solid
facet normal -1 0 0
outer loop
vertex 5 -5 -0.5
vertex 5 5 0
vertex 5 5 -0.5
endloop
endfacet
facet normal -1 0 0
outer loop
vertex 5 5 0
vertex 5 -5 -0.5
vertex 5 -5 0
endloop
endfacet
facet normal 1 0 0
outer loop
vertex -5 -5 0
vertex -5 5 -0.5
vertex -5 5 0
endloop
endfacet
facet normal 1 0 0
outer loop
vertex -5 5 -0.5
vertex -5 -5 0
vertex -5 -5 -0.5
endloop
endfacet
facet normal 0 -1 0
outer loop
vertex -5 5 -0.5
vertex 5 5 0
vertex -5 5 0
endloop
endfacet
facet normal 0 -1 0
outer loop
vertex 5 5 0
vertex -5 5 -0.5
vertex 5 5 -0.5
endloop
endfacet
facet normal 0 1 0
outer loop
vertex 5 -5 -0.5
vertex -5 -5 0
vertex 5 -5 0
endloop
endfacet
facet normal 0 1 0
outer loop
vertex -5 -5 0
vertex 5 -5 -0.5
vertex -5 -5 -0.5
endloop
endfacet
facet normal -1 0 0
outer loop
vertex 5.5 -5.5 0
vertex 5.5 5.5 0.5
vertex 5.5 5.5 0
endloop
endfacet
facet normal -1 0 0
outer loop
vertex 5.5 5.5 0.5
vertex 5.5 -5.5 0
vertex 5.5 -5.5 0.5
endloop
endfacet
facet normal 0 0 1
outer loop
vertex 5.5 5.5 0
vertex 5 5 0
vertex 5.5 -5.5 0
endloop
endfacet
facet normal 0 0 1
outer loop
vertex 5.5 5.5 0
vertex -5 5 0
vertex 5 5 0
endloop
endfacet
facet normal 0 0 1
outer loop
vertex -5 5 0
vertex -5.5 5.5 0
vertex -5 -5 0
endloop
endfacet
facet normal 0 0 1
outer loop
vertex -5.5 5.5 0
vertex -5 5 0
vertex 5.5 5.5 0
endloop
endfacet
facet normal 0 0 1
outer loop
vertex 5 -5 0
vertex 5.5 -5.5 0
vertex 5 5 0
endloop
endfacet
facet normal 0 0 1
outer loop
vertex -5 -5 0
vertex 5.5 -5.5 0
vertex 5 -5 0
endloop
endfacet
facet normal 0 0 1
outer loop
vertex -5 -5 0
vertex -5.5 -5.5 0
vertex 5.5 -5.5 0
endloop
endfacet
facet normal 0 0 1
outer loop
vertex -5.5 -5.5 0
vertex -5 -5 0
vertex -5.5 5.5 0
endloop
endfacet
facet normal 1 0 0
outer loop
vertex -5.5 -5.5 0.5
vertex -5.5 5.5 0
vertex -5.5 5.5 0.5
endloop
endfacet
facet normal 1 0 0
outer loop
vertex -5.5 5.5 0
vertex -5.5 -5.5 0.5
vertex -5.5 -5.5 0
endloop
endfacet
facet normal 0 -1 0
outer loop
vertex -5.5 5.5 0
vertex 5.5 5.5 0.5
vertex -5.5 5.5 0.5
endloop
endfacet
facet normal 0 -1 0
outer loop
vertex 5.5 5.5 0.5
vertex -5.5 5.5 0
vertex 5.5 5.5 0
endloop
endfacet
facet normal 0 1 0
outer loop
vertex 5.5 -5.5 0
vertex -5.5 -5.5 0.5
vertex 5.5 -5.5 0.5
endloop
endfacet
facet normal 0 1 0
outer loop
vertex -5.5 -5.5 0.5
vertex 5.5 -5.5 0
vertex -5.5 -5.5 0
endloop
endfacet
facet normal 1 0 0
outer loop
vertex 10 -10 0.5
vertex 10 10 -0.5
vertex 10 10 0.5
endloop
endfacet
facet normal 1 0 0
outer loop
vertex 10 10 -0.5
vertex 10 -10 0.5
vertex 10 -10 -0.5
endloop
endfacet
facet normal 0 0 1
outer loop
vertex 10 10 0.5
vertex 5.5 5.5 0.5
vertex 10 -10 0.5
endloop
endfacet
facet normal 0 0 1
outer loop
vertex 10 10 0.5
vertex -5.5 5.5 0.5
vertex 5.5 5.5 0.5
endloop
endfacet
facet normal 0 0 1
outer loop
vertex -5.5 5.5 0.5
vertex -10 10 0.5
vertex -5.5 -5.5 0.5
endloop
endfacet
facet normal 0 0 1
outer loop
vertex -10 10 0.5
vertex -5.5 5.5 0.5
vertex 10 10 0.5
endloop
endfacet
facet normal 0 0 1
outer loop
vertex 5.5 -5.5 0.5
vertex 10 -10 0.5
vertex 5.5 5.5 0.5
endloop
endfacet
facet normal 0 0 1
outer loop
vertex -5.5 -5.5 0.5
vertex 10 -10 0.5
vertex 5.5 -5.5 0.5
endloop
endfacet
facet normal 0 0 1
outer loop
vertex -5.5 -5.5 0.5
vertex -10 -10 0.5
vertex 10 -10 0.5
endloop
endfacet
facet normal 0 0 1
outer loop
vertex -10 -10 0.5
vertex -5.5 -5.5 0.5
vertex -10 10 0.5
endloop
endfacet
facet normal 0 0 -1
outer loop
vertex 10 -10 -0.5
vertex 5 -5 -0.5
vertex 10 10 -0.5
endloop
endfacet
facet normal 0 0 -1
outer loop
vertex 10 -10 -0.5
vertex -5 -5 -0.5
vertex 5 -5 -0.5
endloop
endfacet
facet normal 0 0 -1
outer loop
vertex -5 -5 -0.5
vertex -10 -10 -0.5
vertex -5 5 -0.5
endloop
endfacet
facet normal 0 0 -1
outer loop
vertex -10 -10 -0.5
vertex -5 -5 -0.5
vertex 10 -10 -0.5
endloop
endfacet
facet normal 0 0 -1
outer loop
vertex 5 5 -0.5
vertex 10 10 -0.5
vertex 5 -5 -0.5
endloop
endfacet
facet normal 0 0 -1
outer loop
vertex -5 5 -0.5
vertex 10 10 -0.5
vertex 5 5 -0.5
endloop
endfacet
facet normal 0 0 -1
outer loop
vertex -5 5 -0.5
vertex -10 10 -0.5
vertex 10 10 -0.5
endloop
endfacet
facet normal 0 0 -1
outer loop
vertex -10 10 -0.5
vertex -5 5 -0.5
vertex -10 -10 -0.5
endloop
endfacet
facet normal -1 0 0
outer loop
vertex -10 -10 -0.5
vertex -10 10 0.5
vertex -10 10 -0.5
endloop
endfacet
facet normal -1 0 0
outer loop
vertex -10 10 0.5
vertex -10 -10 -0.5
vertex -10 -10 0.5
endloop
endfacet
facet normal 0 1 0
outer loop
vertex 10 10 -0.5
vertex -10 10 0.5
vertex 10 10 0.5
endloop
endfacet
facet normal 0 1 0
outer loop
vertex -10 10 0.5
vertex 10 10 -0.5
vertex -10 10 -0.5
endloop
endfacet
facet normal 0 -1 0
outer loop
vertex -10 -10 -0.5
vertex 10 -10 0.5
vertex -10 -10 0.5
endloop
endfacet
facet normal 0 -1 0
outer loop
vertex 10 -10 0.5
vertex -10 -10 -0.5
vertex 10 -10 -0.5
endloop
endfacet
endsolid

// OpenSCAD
// not sure if a complicate subtraction is the right way to go
// also this isn't quite correct

height = 1;

difference() { 

  cube([20,20,height], center = true);


   group() { 
    color( "red") {
       cube([10,10, height * 2], center = true);
      } 
      
    translate([0,0,height / 2]) {
      color( "green") {
       cube([11,11, height], center = true);
      }
   } 
  }
 
}
